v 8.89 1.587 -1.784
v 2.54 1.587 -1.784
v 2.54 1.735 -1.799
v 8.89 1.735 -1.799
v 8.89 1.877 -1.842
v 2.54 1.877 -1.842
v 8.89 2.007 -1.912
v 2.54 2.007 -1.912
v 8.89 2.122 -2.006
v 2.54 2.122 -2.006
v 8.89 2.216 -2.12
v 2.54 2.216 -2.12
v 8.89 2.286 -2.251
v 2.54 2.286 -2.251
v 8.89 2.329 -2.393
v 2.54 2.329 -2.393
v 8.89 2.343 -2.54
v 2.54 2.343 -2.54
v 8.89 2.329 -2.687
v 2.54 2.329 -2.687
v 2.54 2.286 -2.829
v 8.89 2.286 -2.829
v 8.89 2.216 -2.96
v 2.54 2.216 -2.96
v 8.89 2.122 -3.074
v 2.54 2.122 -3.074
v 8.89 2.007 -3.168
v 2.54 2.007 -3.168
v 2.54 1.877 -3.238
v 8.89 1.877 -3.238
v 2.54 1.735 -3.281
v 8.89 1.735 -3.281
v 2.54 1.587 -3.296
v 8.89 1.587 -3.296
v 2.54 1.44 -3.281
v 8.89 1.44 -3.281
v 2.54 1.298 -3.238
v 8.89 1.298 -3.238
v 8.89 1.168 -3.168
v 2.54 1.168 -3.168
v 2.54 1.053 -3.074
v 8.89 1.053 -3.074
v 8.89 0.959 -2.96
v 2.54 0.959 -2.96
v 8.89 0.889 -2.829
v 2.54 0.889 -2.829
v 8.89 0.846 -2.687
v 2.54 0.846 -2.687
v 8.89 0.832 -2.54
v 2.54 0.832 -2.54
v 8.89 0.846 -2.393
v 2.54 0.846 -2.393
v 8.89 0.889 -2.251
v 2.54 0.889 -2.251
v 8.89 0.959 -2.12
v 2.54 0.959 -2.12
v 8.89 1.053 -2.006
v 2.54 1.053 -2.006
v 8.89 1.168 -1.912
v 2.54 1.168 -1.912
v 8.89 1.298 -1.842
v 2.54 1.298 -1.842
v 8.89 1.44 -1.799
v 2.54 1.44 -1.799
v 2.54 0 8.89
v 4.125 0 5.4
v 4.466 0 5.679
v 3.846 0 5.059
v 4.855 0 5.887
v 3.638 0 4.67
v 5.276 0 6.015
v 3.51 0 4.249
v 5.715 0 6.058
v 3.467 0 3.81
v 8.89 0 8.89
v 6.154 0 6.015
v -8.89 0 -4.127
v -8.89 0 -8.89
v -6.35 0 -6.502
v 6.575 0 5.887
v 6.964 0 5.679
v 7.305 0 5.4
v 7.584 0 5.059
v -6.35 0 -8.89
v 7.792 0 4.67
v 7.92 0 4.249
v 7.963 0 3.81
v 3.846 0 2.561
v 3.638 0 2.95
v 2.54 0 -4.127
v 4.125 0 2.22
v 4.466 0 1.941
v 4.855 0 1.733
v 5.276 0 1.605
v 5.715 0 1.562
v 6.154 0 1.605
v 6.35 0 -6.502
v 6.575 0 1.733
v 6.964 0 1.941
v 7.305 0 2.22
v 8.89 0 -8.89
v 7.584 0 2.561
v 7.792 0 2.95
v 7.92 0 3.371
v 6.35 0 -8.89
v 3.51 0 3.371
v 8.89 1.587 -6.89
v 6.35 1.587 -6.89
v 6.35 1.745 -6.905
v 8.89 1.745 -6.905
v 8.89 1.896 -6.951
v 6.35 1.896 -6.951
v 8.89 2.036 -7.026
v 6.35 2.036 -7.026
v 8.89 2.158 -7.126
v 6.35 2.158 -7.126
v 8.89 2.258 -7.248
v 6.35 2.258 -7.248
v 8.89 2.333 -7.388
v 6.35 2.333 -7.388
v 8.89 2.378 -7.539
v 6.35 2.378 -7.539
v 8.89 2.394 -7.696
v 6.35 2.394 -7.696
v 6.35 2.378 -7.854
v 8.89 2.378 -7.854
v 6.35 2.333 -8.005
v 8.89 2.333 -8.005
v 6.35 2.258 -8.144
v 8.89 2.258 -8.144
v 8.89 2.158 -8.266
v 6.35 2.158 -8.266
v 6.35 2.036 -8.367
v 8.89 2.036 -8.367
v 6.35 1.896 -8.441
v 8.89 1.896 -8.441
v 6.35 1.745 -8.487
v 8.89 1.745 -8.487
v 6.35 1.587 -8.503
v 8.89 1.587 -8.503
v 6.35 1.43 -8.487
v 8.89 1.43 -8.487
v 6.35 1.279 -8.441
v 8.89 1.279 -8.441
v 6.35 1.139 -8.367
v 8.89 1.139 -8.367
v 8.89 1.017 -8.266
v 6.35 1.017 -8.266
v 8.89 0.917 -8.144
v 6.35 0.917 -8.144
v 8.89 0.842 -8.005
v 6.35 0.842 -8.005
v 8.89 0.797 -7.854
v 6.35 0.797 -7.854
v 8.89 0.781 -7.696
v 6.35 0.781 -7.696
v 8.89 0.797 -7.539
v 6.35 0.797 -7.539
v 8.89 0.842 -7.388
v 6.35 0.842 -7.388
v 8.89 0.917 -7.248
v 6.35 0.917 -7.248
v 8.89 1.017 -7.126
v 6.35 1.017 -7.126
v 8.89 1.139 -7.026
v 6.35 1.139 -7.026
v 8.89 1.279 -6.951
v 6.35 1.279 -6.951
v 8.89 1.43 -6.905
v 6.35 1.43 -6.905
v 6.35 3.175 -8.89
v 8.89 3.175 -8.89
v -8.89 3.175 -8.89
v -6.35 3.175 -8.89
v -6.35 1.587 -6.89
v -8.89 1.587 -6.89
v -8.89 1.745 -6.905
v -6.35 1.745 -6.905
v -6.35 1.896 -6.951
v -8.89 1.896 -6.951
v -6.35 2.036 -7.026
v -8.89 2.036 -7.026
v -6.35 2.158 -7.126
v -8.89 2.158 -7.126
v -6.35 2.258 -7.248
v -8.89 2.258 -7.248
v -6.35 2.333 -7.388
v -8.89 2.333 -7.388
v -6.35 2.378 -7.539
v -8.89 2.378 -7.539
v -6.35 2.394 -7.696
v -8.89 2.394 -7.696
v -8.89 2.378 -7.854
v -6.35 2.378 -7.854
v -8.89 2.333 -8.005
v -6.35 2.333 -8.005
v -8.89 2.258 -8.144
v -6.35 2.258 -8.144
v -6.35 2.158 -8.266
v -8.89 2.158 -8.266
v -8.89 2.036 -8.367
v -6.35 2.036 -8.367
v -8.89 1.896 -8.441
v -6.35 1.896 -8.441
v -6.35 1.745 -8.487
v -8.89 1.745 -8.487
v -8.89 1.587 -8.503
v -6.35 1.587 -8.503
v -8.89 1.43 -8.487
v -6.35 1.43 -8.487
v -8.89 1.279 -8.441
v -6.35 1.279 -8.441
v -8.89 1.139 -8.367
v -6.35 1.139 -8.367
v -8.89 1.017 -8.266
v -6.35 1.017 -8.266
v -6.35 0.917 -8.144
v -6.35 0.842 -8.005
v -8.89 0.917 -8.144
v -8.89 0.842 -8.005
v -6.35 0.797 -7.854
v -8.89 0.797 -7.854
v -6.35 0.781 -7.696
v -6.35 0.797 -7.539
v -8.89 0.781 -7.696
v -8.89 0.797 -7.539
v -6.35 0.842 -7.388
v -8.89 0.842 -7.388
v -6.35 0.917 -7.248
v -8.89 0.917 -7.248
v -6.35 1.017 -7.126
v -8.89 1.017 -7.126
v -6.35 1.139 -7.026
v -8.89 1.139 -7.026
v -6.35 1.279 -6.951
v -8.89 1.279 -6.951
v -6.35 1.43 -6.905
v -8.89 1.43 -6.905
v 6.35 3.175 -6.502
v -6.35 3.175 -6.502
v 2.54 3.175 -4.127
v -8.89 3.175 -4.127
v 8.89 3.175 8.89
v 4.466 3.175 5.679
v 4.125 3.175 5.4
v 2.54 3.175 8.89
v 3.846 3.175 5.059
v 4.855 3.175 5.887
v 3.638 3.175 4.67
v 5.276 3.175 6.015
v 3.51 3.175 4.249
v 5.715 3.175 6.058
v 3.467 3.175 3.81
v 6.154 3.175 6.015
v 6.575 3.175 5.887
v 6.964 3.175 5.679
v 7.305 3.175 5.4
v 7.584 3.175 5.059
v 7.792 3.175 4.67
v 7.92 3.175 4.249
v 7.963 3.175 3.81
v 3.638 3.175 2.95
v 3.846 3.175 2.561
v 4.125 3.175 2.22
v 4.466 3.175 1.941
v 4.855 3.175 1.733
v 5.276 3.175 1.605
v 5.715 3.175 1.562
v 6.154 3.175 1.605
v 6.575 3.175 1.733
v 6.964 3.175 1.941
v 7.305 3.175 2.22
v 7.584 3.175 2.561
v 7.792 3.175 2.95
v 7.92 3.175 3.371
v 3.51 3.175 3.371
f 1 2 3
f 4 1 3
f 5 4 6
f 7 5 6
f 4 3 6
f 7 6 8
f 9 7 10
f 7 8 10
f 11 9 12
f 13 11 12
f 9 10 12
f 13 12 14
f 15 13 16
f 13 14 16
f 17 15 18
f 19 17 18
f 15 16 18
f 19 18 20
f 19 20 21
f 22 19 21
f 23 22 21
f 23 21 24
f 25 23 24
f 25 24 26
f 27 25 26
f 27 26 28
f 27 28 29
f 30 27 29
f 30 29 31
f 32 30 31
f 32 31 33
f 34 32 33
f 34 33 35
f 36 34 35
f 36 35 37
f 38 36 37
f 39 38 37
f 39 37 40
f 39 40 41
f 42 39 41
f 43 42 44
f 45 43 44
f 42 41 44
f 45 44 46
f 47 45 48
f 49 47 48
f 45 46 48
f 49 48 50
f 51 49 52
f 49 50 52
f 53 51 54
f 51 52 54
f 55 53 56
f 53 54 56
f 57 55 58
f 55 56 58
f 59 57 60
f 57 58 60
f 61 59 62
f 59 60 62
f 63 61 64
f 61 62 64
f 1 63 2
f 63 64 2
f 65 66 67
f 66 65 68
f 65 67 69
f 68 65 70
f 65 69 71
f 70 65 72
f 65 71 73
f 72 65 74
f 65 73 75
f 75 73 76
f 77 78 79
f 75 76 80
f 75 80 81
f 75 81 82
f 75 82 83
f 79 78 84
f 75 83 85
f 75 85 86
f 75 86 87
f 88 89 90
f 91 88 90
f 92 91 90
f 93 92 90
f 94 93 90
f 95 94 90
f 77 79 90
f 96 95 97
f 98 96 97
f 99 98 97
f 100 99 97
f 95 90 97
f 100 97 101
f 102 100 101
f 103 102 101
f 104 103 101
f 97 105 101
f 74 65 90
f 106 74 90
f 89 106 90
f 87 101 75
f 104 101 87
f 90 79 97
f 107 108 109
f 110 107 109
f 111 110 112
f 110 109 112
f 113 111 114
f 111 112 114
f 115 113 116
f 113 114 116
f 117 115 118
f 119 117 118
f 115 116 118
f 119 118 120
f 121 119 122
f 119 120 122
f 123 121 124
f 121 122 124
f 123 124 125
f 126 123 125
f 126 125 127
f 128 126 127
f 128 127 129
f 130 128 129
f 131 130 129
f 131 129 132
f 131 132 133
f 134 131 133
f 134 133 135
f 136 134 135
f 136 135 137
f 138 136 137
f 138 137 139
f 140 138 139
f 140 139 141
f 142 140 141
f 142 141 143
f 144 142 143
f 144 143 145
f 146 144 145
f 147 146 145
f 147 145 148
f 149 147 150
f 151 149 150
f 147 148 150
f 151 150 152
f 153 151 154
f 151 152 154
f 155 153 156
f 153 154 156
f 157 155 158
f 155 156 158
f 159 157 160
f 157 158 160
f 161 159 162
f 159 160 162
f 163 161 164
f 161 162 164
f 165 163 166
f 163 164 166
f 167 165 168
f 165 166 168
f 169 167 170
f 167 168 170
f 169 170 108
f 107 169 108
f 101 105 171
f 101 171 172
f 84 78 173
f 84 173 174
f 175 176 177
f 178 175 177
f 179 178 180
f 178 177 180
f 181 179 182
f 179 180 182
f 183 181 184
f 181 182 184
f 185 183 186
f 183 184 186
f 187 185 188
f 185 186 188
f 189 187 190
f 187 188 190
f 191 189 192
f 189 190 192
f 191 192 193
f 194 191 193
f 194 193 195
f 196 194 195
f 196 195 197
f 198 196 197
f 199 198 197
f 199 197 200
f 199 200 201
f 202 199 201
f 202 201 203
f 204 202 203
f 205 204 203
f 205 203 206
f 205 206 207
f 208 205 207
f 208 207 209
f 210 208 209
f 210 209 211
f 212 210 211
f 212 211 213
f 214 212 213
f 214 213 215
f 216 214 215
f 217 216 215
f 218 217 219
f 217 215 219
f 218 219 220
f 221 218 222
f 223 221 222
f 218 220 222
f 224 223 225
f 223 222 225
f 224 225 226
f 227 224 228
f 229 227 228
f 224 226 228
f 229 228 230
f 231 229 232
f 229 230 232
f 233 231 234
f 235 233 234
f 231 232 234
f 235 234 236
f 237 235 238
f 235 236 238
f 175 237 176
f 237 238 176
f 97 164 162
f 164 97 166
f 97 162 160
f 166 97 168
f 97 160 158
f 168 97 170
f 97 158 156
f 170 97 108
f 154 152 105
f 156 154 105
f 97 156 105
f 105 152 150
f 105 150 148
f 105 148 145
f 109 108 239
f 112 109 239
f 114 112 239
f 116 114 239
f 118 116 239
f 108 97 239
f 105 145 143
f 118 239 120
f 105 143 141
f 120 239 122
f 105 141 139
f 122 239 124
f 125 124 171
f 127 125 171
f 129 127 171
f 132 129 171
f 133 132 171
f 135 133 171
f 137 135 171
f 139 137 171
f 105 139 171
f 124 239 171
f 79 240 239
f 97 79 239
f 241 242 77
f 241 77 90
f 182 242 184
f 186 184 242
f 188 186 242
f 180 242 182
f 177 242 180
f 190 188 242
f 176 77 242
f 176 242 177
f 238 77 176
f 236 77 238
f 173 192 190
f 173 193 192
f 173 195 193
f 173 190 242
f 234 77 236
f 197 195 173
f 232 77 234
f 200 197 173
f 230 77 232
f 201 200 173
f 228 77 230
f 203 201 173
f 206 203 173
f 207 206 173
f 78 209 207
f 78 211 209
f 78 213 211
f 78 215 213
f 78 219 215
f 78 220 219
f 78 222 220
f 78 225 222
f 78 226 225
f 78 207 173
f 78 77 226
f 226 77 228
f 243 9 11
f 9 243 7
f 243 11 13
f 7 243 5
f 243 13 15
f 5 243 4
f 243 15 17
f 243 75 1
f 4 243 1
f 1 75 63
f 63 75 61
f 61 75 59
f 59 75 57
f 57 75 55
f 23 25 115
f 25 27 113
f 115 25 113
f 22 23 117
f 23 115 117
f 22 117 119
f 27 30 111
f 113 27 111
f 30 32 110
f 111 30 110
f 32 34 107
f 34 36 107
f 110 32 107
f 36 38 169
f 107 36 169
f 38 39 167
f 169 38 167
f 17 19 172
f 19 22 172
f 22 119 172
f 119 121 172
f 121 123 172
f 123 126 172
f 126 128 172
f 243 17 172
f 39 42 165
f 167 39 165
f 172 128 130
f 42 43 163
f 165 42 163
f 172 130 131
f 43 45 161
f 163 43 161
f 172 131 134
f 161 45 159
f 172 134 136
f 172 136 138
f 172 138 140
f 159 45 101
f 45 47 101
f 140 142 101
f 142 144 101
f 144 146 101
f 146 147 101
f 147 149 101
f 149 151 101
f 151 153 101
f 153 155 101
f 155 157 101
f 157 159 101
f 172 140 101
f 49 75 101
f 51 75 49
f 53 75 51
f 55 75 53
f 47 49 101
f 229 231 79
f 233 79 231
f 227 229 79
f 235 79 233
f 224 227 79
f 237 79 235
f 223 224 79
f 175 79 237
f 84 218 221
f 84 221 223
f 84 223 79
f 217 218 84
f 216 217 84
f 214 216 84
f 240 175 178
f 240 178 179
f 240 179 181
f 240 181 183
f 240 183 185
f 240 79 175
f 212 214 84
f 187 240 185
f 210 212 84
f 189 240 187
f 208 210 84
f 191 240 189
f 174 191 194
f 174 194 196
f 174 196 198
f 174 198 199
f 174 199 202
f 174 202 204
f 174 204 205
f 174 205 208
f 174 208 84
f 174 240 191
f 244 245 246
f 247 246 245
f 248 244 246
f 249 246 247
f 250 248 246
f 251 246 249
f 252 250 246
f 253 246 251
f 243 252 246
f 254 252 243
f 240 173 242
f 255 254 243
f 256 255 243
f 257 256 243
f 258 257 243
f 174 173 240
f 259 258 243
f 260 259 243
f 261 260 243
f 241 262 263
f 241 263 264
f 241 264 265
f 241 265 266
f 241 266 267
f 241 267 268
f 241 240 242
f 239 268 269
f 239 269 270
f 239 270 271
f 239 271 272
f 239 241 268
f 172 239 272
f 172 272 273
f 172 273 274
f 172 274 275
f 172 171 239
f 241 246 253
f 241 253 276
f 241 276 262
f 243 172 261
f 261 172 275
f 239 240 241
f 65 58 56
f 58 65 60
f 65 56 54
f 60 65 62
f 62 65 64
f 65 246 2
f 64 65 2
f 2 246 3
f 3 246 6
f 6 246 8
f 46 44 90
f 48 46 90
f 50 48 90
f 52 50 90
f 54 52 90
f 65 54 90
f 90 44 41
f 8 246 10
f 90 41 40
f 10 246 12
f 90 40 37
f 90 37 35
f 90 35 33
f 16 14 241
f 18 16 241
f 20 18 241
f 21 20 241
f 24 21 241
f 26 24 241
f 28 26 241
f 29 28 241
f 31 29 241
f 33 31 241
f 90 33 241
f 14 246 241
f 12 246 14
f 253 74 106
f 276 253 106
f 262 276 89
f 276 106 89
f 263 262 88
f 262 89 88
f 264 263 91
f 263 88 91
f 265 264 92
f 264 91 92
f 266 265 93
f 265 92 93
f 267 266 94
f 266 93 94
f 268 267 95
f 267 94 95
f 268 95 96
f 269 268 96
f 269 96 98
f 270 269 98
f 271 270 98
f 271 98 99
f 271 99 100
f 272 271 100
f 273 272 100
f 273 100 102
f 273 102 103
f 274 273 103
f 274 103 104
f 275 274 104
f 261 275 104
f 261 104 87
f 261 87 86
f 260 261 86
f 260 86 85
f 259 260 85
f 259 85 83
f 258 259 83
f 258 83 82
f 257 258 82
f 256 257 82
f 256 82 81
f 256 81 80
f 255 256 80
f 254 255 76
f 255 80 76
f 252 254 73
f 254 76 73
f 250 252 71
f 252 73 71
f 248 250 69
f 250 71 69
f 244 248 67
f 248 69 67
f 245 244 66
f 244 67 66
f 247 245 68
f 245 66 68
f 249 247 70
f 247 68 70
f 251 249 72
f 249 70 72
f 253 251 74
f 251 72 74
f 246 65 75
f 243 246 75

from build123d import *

# Parameters (mm, degrees)
SKETCH1_W             = 17.78
SKETCH1_H             = 17.78
BOSS_EXTRUDE1_DEPTH   = 3.175
SKETCH2_W             = 12.7
SKETCH2_H             = 4.7752
CUT_EXTRUDE1_DEPTH    = 4.175
F_8_CLEARANCE_HOLE1_D = 4.4958
F_0_CLEARANCE_HOLE1_D = 1.6129
F_1_72_TAPPED_HOLE1_D = 1.5113
SKETCH16_W            = 15.75311933
SKETCH16_H            = 13.574133519
CUT_EXTRUDE2_DEPTH    = 4.175


with BuildPart() as part:
    # Sketch1 → Boss-Extrude1 (new body)
    with BuildSketch(Plane(origin=(0, 0, 0), x_dir=(1, 0, 0), z_dir=(0, 1, 0))):
        Rectangle(SKETCH1_W, SKETCH1_H)
    extrude(amount=BOSS_EXTRUDE1_DEPTH)

    # Sketch2 → Cut-Extrude1 (cut, through all)
    with BuildSketch(Plane(origin=(0, 3.175, 0), x_dir=(1, 0, 0), z_dir=(0, 1, 0))):
        with Locations((0, 8.89)):
            Rectangle(SKETCH2_W, SKETCH2_H)
    extrude(amount=-CUT_EXTRUDE1_DEPTH, mode=Mode.SUBTRACT)

    # #8 Clearance Hole1 (through all)
    with Locations(Plane(origin=(0, 3.175, 0), x_dir=(1, 0, 0), z_dir=(0, 1, 0))):
        with Locations((5.715, -3.81)):
            Hole(F_8_CLEARANCE_HOLE1_D / 2)

    # #0 Clearance Hole1 (through all)
    with Locations(Plane(origin=(8.89, 0, 0), x_dir=(0, 0, -1), z_dir=(1, 0, 0))):
        with Locations((7.6962, 1.5875)):
            Hole(F_0_CLEARANCE_HOLE1_D / 2)

    # #1-72 Tapped Hole1 (through all)
    with Locations(Plane(origin=(8.89, 0, 0), x_dir=(0, 0, -1), z_dir=(1, 0, 0))):
        with Locations((2.54, 1.5875)):
            Hole(F_1_72_TAPPED_HOLE1_D / 2)

    # Sketch16 → Cut-Extrude2 (cut, through all)
    with BuildSketch(Plane(origin=(0, 3.175, 0), x_dir=(1, 0, 0), z_dir=(0, 1, 0))):
        with Locations((-5.336559665, -2.65956676)):
            Rectangle(SKETCH16_W, SKETCH16_H)
    extrude(amount=-CUT_EXTRUDE2_DEPTH, mode=Mode.SUBTRACT)


solid = part.part
